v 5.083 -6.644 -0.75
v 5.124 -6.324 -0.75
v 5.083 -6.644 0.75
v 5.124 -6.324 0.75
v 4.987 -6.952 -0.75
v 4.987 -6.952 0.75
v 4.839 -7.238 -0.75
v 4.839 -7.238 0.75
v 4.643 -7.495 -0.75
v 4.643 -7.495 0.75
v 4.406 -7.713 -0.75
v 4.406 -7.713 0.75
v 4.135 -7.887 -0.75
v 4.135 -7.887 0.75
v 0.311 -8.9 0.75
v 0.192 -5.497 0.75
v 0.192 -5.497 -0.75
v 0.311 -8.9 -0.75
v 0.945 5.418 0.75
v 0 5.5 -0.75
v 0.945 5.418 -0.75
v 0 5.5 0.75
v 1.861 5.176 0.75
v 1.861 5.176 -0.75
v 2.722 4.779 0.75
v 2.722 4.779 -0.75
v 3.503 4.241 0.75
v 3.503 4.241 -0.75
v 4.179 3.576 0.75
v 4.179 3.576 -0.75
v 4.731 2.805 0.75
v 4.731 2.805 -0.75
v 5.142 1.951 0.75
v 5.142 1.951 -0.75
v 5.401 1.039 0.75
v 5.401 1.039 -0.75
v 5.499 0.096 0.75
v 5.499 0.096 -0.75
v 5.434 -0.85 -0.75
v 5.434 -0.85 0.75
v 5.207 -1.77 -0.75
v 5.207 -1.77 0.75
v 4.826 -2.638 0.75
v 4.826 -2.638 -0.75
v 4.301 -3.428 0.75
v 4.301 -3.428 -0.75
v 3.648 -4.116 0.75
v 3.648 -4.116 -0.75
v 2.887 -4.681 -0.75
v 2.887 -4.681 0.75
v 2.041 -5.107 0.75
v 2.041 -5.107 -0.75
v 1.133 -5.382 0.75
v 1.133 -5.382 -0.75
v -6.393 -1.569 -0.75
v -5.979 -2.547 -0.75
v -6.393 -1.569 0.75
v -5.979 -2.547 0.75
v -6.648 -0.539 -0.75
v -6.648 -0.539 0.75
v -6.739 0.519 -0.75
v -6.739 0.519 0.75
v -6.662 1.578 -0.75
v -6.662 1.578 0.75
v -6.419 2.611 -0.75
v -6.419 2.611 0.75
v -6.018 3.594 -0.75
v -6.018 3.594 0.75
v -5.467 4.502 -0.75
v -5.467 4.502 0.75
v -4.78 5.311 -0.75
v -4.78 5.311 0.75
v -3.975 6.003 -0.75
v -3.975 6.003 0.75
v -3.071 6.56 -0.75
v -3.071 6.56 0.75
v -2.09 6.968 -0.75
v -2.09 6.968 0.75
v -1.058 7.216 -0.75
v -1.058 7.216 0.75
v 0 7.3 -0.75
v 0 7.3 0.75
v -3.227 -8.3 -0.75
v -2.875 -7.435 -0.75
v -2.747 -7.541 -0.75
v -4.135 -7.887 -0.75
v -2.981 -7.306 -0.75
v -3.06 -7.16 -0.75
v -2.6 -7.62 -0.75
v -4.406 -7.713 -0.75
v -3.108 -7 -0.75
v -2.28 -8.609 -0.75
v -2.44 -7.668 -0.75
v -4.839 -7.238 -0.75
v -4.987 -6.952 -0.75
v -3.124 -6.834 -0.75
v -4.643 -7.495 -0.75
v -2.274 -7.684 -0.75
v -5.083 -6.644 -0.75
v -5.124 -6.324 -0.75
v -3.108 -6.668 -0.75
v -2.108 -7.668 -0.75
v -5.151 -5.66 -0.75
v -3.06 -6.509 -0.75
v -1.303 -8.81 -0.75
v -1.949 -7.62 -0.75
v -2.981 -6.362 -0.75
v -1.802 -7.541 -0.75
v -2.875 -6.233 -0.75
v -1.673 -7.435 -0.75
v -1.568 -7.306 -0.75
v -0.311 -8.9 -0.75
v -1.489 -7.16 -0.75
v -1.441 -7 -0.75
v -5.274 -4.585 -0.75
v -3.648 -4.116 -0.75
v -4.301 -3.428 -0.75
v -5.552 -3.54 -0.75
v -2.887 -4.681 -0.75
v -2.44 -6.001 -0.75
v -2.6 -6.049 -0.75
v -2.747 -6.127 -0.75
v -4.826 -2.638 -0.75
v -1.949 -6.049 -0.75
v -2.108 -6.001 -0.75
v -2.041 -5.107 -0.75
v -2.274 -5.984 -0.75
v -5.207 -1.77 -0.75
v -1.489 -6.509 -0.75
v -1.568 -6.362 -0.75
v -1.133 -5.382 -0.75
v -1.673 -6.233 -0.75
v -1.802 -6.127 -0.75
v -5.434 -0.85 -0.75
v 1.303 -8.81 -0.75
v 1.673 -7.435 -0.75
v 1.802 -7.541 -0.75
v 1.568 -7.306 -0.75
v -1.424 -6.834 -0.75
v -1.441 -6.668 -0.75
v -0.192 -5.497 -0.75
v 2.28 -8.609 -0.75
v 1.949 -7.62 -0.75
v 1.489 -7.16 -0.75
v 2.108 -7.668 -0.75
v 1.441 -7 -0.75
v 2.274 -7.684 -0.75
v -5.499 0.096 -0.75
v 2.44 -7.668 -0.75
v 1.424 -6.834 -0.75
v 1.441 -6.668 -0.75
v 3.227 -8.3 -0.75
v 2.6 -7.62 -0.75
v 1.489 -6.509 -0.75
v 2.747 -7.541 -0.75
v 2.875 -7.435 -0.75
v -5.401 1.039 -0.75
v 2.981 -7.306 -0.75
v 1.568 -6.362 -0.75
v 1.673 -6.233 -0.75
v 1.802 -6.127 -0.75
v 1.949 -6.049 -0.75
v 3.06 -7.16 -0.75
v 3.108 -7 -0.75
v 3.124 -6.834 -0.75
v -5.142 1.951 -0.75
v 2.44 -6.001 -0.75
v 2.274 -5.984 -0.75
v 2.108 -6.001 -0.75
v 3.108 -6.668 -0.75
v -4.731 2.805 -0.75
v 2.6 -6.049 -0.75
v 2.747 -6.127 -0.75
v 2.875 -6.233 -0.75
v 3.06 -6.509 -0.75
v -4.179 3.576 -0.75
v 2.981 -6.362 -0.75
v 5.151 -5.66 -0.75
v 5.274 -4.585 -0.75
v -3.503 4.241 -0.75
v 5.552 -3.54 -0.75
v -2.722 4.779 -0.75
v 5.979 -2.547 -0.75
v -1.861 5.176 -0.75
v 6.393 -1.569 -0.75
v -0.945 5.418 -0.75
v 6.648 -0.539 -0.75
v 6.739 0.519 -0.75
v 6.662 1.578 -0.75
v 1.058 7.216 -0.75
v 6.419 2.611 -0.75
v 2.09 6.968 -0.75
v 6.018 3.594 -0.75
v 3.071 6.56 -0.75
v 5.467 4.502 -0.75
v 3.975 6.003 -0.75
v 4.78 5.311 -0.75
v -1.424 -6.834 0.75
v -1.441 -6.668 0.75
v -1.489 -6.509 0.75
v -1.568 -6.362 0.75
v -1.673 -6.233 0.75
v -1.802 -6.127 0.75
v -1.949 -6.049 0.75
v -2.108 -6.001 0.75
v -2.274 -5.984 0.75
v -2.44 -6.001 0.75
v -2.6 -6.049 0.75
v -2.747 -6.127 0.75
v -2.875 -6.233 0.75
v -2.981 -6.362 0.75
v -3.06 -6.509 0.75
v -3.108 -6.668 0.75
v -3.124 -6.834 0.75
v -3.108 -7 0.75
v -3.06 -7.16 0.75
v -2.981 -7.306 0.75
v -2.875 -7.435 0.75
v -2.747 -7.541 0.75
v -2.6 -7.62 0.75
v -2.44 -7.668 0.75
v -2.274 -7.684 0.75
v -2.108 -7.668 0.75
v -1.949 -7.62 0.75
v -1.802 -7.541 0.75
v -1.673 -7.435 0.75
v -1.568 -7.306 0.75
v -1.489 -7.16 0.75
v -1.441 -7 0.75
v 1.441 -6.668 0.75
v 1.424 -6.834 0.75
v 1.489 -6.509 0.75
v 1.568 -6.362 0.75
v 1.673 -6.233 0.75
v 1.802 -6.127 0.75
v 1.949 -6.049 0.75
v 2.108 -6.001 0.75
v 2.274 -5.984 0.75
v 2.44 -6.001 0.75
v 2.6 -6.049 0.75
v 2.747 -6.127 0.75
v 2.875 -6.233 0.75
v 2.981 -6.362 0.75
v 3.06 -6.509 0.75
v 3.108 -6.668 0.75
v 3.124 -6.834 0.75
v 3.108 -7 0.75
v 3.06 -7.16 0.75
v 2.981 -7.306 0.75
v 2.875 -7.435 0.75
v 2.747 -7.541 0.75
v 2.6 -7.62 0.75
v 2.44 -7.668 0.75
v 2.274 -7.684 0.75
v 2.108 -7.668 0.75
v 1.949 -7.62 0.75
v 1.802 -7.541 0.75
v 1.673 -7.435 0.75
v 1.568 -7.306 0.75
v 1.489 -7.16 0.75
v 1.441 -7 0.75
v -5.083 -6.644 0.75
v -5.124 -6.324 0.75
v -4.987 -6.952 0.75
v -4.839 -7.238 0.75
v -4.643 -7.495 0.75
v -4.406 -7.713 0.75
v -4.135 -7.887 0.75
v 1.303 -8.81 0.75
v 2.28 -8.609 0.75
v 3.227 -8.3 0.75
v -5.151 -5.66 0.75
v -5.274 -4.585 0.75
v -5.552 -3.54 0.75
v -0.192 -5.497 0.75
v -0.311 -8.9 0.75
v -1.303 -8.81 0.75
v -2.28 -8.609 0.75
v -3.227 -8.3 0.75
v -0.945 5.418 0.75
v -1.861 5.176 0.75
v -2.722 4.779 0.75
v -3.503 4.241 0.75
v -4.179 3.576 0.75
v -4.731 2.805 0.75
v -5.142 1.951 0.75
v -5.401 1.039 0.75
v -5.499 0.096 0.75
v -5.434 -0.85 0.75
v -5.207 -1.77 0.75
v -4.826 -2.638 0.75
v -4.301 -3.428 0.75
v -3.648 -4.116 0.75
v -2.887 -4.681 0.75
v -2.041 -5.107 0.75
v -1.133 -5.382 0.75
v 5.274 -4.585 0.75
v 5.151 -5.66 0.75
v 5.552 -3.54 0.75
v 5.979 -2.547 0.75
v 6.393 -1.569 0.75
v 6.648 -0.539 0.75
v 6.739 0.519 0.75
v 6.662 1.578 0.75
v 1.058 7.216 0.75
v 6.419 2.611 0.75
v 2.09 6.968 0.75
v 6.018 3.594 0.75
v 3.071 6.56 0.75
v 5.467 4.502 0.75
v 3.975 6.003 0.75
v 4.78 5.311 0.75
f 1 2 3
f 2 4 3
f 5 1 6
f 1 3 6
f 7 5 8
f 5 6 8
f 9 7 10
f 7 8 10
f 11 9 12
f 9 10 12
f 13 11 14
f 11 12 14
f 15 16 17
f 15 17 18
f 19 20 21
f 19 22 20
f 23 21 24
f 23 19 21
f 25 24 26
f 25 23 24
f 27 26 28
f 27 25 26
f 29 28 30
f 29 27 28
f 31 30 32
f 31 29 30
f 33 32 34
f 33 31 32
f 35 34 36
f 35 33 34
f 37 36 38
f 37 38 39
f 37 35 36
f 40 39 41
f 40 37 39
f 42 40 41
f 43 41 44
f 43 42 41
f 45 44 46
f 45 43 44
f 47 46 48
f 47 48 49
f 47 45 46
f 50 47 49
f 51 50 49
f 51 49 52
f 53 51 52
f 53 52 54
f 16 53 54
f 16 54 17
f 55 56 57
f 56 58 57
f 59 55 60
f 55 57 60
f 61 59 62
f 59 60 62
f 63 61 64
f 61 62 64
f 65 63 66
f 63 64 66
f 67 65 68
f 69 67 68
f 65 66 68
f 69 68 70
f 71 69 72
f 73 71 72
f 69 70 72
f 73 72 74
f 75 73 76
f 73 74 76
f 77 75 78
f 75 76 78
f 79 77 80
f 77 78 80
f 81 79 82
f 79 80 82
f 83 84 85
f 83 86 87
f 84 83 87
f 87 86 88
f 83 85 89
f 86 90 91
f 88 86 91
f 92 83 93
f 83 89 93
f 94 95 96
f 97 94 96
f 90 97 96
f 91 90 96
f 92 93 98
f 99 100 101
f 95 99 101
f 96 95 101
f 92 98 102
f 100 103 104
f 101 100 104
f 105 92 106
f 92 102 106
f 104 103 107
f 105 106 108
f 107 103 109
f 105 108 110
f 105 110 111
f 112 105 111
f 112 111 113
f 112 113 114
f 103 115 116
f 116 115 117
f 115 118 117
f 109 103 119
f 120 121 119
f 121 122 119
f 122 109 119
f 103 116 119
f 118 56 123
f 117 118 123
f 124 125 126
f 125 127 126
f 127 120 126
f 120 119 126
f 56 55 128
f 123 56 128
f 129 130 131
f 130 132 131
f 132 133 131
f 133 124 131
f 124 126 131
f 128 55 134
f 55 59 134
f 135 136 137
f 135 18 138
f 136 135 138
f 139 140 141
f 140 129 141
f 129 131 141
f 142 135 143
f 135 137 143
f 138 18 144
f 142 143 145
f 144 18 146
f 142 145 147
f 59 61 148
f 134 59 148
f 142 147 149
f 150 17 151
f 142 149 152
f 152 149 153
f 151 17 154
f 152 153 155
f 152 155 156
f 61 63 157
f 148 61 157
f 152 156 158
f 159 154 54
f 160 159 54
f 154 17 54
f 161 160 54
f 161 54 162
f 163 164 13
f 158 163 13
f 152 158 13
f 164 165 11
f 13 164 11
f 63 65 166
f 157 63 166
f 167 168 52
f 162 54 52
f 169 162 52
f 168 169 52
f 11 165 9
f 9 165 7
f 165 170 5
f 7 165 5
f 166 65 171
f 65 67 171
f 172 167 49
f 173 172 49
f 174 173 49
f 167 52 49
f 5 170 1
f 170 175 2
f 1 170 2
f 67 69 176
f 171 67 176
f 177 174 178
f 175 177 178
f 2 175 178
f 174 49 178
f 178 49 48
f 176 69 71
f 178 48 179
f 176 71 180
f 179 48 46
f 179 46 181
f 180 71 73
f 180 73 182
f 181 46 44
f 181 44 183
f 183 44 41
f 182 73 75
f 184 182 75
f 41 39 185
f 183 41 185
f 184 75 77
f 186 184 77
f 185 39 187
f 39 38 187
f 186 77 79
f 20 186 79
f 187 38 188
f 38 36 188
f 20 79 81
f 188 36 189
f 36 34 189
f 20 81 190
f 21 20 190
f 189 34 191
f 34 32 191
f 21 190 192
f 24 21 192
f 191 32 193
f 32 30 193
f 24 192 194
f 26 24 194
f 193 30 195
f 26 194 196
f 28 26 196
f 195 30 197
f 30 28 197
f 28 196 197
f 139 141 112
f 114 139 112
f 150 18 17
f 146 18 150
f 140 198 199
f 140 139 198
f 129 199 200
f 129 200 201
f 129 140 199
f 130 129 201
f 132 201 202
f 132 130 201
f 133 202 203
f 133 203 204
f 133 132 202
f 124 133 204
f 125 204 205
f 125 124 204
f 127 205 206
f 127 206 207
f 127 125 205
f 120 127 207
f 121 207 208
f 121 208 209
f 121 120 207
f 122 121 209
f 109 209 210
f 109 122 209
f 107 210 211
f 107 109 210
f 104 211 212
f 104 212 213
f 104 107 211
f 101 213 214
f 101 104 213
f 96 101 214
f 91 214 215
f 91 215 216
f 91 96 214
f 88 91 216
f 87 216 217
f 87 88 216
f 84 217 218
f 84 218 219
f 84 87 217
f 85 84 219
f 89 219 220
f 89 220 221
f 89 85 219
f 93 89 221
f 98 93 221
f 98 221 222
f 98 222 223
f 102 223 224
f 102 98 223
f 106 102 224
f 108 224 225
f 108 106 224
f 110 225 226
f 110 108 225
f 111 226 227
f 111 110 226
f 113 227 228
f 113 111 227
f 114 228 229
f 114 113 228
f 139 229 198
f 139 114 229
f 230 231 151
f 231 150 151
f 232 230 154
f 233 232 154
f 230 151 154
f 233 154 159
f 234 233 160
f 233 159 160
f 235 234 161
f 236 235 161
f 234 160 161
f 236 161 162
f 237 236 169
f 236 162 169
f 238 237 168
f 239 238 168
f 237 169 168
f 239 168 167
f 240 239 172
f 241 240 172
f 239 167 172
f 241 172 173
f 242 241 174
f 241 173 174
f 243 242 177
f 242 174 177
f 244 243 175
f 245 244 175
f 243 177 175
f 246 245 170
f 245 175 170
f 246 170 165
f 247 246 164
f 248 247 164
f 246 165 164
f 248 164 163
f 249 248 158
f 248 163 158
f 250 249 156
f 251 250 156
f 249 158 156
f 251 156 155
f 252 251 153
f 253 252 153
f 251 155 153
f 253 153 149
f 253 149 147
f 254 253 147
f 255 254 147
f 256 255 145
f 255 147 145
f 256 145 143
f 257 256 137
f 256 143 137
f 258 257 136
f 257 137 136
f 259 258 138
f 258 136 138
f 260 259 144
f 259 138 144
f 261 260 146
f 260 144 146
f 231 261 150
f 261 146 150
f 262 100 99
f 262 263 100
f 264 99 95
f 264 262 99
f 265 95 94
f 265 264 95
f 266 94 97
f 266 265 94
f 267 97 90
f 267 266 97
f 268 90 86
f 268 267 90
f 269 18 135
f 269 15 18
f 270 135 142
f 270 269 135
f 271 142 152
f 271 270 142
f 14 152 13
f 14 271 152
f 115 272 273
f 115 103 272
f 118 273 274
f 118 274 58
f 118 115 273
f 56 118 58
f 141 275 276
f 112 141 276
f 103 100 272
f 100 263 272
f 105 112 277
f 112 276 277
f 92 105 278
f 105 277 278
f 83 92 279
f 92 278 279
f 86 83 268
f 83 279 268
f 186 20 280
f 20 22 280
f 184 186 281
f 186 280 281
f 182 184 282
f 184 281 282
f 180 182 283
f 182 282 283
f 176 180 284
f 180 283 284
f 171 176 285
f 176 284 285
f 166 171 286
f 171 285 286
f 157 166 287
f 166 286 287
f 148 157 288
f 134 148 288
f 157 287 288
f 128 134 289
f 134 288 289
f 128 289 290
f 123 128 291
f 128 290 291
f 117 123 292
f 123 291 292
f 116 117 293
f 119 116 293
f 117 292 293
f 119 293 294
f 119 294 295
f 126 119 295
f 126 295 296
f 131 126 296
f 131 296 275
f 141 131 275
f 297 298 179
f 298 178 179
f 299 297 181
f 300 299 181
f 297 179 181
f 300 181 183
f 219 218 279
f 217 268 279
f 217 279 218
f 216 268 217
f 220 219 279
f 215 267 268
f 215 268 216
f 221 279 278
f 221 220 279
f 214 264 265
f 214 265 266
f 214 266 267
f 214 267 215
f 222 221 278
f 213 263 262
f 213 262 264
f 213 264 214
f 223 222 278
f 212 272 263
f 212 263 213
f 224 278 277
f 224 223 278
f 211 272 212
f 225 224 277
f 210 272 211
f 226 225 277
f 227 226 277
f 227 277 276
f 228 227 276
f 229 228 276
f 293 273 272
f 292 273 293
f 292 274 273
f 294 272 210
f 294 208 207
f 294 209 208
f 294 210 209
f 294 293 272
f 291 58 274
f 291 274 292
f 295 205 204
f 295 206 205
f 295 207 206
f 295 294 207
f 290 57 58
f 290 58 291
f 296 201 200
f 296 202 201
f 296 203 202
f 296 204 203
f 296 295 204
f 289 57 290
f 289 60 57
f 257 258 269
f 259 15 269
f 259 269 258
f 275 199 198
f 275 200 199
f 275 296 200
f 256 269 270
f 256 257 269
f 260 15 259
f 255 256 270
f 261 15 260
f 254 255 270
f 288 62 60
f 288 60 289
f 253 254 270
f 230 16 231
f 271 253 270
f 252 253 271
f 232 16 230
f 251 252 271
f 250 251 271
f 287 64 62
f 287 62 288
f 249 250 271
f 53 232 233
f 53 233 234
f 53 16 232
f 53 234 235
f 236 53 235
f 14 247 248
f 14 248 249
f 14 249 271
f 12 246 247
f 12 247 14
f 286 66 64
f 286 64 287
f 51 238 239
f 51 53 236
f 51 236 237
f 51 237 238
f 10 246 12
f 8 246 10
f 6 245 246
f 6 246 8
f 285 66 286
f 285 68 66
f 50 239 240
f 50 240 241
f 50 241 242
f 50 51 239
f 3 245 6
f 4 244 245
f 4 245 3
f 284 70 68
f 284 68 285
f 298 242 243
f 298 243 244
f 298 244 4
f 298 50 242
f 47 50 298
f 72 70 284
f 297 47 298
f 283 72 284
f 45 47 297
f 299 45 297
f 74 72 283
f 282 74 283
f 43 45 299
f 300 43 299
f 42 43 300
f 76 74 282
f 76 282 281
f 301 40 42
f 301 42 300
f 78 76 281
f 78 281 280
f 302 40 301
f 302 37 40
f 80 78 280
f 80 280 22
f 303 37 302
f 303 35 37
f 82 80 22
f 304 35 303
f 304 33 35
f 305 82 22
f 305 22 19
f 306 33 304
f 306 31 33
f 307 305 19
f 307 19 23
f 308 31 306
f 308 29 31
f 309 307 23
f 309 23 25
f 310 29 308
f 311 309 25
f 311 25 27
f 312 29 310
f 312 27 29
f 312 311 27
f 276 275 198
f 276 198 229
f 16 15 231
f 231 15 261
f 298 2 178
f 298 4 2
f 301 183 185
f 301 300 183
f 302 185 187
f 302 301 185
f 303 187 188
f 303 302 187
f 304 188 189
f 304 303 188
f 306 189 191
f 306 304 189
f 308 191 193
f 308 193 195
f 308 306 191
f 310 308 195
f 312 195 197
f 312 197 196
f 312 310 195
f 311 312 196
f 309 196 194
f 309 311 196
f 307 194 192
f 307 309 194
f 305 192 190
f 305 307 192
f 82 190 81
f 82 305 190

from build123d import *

# Parameters (mm, degrees)
SKETCH2_R           = 0.85
BOSS_EXTRUDE1_DEPTH = 0.75
FILLET1_R           = 7.400617123
FILLET2_R           = 1.850154281


with BuildPart() as part:
    # Sketch2 → Boss-Extrude1 (new body, symmetric)
    with BuildSketch(Plane.XY):
        with BuildLine():
            Line((-5.084030917, -7.311581435), (-5.231445397, -3.68673013))
            ThreePointArc((-5.231445397, -3.68673013), (-6.08432946, 3.458247986), (0, 7.3))
            Line((0, 7.3), (0, 5.5))
            ThreePointArc((0, 5.5), (-5.499162323, 0.095988235), (-0.191947232, -5.496649549))
            Line((-0.191947232, -5.496649549), (-0.310794848, -8.9))
            ThreePointArc((-0.310794848, -8.9), (-2.811904096, -8.449839572), (-5.084030917, -7.311581435))
        make_face()
        with Locations((-2.274269541, -6.834234779)):
            Circle(SKETCH2_R, mode=Mode.SUBTRACT)
    extrude(amount=BOSS_EXTRUDE1_DEPTH, both=True)

    # Fillet1
    fillet1_edges = [part.edges().sort_by_distance(p)[0] for p in [
        (-5.231445397, -3.68673013, 0),
    ]]
    fillet(fillet1_edges, radius=FILLET1_R)

    # Fillet2
    fillet2_edges = [part.edges().sort_by_distance(p)[0] for p in [
        (-5.084030917, -7.311581435, 0),
    ]]
    fillet(fillet2_edges, radius=FILLET2_R)

    # Mirror1: part across plane


with BuildPart() as part_1:
    add(part.part)
    add(part.part.mirror(Plane(origin=(0, 7.3, 0.75), x_dir=(0, 0, 1), z_dir=(-1, 0, 0))))


solid = part_1.part
